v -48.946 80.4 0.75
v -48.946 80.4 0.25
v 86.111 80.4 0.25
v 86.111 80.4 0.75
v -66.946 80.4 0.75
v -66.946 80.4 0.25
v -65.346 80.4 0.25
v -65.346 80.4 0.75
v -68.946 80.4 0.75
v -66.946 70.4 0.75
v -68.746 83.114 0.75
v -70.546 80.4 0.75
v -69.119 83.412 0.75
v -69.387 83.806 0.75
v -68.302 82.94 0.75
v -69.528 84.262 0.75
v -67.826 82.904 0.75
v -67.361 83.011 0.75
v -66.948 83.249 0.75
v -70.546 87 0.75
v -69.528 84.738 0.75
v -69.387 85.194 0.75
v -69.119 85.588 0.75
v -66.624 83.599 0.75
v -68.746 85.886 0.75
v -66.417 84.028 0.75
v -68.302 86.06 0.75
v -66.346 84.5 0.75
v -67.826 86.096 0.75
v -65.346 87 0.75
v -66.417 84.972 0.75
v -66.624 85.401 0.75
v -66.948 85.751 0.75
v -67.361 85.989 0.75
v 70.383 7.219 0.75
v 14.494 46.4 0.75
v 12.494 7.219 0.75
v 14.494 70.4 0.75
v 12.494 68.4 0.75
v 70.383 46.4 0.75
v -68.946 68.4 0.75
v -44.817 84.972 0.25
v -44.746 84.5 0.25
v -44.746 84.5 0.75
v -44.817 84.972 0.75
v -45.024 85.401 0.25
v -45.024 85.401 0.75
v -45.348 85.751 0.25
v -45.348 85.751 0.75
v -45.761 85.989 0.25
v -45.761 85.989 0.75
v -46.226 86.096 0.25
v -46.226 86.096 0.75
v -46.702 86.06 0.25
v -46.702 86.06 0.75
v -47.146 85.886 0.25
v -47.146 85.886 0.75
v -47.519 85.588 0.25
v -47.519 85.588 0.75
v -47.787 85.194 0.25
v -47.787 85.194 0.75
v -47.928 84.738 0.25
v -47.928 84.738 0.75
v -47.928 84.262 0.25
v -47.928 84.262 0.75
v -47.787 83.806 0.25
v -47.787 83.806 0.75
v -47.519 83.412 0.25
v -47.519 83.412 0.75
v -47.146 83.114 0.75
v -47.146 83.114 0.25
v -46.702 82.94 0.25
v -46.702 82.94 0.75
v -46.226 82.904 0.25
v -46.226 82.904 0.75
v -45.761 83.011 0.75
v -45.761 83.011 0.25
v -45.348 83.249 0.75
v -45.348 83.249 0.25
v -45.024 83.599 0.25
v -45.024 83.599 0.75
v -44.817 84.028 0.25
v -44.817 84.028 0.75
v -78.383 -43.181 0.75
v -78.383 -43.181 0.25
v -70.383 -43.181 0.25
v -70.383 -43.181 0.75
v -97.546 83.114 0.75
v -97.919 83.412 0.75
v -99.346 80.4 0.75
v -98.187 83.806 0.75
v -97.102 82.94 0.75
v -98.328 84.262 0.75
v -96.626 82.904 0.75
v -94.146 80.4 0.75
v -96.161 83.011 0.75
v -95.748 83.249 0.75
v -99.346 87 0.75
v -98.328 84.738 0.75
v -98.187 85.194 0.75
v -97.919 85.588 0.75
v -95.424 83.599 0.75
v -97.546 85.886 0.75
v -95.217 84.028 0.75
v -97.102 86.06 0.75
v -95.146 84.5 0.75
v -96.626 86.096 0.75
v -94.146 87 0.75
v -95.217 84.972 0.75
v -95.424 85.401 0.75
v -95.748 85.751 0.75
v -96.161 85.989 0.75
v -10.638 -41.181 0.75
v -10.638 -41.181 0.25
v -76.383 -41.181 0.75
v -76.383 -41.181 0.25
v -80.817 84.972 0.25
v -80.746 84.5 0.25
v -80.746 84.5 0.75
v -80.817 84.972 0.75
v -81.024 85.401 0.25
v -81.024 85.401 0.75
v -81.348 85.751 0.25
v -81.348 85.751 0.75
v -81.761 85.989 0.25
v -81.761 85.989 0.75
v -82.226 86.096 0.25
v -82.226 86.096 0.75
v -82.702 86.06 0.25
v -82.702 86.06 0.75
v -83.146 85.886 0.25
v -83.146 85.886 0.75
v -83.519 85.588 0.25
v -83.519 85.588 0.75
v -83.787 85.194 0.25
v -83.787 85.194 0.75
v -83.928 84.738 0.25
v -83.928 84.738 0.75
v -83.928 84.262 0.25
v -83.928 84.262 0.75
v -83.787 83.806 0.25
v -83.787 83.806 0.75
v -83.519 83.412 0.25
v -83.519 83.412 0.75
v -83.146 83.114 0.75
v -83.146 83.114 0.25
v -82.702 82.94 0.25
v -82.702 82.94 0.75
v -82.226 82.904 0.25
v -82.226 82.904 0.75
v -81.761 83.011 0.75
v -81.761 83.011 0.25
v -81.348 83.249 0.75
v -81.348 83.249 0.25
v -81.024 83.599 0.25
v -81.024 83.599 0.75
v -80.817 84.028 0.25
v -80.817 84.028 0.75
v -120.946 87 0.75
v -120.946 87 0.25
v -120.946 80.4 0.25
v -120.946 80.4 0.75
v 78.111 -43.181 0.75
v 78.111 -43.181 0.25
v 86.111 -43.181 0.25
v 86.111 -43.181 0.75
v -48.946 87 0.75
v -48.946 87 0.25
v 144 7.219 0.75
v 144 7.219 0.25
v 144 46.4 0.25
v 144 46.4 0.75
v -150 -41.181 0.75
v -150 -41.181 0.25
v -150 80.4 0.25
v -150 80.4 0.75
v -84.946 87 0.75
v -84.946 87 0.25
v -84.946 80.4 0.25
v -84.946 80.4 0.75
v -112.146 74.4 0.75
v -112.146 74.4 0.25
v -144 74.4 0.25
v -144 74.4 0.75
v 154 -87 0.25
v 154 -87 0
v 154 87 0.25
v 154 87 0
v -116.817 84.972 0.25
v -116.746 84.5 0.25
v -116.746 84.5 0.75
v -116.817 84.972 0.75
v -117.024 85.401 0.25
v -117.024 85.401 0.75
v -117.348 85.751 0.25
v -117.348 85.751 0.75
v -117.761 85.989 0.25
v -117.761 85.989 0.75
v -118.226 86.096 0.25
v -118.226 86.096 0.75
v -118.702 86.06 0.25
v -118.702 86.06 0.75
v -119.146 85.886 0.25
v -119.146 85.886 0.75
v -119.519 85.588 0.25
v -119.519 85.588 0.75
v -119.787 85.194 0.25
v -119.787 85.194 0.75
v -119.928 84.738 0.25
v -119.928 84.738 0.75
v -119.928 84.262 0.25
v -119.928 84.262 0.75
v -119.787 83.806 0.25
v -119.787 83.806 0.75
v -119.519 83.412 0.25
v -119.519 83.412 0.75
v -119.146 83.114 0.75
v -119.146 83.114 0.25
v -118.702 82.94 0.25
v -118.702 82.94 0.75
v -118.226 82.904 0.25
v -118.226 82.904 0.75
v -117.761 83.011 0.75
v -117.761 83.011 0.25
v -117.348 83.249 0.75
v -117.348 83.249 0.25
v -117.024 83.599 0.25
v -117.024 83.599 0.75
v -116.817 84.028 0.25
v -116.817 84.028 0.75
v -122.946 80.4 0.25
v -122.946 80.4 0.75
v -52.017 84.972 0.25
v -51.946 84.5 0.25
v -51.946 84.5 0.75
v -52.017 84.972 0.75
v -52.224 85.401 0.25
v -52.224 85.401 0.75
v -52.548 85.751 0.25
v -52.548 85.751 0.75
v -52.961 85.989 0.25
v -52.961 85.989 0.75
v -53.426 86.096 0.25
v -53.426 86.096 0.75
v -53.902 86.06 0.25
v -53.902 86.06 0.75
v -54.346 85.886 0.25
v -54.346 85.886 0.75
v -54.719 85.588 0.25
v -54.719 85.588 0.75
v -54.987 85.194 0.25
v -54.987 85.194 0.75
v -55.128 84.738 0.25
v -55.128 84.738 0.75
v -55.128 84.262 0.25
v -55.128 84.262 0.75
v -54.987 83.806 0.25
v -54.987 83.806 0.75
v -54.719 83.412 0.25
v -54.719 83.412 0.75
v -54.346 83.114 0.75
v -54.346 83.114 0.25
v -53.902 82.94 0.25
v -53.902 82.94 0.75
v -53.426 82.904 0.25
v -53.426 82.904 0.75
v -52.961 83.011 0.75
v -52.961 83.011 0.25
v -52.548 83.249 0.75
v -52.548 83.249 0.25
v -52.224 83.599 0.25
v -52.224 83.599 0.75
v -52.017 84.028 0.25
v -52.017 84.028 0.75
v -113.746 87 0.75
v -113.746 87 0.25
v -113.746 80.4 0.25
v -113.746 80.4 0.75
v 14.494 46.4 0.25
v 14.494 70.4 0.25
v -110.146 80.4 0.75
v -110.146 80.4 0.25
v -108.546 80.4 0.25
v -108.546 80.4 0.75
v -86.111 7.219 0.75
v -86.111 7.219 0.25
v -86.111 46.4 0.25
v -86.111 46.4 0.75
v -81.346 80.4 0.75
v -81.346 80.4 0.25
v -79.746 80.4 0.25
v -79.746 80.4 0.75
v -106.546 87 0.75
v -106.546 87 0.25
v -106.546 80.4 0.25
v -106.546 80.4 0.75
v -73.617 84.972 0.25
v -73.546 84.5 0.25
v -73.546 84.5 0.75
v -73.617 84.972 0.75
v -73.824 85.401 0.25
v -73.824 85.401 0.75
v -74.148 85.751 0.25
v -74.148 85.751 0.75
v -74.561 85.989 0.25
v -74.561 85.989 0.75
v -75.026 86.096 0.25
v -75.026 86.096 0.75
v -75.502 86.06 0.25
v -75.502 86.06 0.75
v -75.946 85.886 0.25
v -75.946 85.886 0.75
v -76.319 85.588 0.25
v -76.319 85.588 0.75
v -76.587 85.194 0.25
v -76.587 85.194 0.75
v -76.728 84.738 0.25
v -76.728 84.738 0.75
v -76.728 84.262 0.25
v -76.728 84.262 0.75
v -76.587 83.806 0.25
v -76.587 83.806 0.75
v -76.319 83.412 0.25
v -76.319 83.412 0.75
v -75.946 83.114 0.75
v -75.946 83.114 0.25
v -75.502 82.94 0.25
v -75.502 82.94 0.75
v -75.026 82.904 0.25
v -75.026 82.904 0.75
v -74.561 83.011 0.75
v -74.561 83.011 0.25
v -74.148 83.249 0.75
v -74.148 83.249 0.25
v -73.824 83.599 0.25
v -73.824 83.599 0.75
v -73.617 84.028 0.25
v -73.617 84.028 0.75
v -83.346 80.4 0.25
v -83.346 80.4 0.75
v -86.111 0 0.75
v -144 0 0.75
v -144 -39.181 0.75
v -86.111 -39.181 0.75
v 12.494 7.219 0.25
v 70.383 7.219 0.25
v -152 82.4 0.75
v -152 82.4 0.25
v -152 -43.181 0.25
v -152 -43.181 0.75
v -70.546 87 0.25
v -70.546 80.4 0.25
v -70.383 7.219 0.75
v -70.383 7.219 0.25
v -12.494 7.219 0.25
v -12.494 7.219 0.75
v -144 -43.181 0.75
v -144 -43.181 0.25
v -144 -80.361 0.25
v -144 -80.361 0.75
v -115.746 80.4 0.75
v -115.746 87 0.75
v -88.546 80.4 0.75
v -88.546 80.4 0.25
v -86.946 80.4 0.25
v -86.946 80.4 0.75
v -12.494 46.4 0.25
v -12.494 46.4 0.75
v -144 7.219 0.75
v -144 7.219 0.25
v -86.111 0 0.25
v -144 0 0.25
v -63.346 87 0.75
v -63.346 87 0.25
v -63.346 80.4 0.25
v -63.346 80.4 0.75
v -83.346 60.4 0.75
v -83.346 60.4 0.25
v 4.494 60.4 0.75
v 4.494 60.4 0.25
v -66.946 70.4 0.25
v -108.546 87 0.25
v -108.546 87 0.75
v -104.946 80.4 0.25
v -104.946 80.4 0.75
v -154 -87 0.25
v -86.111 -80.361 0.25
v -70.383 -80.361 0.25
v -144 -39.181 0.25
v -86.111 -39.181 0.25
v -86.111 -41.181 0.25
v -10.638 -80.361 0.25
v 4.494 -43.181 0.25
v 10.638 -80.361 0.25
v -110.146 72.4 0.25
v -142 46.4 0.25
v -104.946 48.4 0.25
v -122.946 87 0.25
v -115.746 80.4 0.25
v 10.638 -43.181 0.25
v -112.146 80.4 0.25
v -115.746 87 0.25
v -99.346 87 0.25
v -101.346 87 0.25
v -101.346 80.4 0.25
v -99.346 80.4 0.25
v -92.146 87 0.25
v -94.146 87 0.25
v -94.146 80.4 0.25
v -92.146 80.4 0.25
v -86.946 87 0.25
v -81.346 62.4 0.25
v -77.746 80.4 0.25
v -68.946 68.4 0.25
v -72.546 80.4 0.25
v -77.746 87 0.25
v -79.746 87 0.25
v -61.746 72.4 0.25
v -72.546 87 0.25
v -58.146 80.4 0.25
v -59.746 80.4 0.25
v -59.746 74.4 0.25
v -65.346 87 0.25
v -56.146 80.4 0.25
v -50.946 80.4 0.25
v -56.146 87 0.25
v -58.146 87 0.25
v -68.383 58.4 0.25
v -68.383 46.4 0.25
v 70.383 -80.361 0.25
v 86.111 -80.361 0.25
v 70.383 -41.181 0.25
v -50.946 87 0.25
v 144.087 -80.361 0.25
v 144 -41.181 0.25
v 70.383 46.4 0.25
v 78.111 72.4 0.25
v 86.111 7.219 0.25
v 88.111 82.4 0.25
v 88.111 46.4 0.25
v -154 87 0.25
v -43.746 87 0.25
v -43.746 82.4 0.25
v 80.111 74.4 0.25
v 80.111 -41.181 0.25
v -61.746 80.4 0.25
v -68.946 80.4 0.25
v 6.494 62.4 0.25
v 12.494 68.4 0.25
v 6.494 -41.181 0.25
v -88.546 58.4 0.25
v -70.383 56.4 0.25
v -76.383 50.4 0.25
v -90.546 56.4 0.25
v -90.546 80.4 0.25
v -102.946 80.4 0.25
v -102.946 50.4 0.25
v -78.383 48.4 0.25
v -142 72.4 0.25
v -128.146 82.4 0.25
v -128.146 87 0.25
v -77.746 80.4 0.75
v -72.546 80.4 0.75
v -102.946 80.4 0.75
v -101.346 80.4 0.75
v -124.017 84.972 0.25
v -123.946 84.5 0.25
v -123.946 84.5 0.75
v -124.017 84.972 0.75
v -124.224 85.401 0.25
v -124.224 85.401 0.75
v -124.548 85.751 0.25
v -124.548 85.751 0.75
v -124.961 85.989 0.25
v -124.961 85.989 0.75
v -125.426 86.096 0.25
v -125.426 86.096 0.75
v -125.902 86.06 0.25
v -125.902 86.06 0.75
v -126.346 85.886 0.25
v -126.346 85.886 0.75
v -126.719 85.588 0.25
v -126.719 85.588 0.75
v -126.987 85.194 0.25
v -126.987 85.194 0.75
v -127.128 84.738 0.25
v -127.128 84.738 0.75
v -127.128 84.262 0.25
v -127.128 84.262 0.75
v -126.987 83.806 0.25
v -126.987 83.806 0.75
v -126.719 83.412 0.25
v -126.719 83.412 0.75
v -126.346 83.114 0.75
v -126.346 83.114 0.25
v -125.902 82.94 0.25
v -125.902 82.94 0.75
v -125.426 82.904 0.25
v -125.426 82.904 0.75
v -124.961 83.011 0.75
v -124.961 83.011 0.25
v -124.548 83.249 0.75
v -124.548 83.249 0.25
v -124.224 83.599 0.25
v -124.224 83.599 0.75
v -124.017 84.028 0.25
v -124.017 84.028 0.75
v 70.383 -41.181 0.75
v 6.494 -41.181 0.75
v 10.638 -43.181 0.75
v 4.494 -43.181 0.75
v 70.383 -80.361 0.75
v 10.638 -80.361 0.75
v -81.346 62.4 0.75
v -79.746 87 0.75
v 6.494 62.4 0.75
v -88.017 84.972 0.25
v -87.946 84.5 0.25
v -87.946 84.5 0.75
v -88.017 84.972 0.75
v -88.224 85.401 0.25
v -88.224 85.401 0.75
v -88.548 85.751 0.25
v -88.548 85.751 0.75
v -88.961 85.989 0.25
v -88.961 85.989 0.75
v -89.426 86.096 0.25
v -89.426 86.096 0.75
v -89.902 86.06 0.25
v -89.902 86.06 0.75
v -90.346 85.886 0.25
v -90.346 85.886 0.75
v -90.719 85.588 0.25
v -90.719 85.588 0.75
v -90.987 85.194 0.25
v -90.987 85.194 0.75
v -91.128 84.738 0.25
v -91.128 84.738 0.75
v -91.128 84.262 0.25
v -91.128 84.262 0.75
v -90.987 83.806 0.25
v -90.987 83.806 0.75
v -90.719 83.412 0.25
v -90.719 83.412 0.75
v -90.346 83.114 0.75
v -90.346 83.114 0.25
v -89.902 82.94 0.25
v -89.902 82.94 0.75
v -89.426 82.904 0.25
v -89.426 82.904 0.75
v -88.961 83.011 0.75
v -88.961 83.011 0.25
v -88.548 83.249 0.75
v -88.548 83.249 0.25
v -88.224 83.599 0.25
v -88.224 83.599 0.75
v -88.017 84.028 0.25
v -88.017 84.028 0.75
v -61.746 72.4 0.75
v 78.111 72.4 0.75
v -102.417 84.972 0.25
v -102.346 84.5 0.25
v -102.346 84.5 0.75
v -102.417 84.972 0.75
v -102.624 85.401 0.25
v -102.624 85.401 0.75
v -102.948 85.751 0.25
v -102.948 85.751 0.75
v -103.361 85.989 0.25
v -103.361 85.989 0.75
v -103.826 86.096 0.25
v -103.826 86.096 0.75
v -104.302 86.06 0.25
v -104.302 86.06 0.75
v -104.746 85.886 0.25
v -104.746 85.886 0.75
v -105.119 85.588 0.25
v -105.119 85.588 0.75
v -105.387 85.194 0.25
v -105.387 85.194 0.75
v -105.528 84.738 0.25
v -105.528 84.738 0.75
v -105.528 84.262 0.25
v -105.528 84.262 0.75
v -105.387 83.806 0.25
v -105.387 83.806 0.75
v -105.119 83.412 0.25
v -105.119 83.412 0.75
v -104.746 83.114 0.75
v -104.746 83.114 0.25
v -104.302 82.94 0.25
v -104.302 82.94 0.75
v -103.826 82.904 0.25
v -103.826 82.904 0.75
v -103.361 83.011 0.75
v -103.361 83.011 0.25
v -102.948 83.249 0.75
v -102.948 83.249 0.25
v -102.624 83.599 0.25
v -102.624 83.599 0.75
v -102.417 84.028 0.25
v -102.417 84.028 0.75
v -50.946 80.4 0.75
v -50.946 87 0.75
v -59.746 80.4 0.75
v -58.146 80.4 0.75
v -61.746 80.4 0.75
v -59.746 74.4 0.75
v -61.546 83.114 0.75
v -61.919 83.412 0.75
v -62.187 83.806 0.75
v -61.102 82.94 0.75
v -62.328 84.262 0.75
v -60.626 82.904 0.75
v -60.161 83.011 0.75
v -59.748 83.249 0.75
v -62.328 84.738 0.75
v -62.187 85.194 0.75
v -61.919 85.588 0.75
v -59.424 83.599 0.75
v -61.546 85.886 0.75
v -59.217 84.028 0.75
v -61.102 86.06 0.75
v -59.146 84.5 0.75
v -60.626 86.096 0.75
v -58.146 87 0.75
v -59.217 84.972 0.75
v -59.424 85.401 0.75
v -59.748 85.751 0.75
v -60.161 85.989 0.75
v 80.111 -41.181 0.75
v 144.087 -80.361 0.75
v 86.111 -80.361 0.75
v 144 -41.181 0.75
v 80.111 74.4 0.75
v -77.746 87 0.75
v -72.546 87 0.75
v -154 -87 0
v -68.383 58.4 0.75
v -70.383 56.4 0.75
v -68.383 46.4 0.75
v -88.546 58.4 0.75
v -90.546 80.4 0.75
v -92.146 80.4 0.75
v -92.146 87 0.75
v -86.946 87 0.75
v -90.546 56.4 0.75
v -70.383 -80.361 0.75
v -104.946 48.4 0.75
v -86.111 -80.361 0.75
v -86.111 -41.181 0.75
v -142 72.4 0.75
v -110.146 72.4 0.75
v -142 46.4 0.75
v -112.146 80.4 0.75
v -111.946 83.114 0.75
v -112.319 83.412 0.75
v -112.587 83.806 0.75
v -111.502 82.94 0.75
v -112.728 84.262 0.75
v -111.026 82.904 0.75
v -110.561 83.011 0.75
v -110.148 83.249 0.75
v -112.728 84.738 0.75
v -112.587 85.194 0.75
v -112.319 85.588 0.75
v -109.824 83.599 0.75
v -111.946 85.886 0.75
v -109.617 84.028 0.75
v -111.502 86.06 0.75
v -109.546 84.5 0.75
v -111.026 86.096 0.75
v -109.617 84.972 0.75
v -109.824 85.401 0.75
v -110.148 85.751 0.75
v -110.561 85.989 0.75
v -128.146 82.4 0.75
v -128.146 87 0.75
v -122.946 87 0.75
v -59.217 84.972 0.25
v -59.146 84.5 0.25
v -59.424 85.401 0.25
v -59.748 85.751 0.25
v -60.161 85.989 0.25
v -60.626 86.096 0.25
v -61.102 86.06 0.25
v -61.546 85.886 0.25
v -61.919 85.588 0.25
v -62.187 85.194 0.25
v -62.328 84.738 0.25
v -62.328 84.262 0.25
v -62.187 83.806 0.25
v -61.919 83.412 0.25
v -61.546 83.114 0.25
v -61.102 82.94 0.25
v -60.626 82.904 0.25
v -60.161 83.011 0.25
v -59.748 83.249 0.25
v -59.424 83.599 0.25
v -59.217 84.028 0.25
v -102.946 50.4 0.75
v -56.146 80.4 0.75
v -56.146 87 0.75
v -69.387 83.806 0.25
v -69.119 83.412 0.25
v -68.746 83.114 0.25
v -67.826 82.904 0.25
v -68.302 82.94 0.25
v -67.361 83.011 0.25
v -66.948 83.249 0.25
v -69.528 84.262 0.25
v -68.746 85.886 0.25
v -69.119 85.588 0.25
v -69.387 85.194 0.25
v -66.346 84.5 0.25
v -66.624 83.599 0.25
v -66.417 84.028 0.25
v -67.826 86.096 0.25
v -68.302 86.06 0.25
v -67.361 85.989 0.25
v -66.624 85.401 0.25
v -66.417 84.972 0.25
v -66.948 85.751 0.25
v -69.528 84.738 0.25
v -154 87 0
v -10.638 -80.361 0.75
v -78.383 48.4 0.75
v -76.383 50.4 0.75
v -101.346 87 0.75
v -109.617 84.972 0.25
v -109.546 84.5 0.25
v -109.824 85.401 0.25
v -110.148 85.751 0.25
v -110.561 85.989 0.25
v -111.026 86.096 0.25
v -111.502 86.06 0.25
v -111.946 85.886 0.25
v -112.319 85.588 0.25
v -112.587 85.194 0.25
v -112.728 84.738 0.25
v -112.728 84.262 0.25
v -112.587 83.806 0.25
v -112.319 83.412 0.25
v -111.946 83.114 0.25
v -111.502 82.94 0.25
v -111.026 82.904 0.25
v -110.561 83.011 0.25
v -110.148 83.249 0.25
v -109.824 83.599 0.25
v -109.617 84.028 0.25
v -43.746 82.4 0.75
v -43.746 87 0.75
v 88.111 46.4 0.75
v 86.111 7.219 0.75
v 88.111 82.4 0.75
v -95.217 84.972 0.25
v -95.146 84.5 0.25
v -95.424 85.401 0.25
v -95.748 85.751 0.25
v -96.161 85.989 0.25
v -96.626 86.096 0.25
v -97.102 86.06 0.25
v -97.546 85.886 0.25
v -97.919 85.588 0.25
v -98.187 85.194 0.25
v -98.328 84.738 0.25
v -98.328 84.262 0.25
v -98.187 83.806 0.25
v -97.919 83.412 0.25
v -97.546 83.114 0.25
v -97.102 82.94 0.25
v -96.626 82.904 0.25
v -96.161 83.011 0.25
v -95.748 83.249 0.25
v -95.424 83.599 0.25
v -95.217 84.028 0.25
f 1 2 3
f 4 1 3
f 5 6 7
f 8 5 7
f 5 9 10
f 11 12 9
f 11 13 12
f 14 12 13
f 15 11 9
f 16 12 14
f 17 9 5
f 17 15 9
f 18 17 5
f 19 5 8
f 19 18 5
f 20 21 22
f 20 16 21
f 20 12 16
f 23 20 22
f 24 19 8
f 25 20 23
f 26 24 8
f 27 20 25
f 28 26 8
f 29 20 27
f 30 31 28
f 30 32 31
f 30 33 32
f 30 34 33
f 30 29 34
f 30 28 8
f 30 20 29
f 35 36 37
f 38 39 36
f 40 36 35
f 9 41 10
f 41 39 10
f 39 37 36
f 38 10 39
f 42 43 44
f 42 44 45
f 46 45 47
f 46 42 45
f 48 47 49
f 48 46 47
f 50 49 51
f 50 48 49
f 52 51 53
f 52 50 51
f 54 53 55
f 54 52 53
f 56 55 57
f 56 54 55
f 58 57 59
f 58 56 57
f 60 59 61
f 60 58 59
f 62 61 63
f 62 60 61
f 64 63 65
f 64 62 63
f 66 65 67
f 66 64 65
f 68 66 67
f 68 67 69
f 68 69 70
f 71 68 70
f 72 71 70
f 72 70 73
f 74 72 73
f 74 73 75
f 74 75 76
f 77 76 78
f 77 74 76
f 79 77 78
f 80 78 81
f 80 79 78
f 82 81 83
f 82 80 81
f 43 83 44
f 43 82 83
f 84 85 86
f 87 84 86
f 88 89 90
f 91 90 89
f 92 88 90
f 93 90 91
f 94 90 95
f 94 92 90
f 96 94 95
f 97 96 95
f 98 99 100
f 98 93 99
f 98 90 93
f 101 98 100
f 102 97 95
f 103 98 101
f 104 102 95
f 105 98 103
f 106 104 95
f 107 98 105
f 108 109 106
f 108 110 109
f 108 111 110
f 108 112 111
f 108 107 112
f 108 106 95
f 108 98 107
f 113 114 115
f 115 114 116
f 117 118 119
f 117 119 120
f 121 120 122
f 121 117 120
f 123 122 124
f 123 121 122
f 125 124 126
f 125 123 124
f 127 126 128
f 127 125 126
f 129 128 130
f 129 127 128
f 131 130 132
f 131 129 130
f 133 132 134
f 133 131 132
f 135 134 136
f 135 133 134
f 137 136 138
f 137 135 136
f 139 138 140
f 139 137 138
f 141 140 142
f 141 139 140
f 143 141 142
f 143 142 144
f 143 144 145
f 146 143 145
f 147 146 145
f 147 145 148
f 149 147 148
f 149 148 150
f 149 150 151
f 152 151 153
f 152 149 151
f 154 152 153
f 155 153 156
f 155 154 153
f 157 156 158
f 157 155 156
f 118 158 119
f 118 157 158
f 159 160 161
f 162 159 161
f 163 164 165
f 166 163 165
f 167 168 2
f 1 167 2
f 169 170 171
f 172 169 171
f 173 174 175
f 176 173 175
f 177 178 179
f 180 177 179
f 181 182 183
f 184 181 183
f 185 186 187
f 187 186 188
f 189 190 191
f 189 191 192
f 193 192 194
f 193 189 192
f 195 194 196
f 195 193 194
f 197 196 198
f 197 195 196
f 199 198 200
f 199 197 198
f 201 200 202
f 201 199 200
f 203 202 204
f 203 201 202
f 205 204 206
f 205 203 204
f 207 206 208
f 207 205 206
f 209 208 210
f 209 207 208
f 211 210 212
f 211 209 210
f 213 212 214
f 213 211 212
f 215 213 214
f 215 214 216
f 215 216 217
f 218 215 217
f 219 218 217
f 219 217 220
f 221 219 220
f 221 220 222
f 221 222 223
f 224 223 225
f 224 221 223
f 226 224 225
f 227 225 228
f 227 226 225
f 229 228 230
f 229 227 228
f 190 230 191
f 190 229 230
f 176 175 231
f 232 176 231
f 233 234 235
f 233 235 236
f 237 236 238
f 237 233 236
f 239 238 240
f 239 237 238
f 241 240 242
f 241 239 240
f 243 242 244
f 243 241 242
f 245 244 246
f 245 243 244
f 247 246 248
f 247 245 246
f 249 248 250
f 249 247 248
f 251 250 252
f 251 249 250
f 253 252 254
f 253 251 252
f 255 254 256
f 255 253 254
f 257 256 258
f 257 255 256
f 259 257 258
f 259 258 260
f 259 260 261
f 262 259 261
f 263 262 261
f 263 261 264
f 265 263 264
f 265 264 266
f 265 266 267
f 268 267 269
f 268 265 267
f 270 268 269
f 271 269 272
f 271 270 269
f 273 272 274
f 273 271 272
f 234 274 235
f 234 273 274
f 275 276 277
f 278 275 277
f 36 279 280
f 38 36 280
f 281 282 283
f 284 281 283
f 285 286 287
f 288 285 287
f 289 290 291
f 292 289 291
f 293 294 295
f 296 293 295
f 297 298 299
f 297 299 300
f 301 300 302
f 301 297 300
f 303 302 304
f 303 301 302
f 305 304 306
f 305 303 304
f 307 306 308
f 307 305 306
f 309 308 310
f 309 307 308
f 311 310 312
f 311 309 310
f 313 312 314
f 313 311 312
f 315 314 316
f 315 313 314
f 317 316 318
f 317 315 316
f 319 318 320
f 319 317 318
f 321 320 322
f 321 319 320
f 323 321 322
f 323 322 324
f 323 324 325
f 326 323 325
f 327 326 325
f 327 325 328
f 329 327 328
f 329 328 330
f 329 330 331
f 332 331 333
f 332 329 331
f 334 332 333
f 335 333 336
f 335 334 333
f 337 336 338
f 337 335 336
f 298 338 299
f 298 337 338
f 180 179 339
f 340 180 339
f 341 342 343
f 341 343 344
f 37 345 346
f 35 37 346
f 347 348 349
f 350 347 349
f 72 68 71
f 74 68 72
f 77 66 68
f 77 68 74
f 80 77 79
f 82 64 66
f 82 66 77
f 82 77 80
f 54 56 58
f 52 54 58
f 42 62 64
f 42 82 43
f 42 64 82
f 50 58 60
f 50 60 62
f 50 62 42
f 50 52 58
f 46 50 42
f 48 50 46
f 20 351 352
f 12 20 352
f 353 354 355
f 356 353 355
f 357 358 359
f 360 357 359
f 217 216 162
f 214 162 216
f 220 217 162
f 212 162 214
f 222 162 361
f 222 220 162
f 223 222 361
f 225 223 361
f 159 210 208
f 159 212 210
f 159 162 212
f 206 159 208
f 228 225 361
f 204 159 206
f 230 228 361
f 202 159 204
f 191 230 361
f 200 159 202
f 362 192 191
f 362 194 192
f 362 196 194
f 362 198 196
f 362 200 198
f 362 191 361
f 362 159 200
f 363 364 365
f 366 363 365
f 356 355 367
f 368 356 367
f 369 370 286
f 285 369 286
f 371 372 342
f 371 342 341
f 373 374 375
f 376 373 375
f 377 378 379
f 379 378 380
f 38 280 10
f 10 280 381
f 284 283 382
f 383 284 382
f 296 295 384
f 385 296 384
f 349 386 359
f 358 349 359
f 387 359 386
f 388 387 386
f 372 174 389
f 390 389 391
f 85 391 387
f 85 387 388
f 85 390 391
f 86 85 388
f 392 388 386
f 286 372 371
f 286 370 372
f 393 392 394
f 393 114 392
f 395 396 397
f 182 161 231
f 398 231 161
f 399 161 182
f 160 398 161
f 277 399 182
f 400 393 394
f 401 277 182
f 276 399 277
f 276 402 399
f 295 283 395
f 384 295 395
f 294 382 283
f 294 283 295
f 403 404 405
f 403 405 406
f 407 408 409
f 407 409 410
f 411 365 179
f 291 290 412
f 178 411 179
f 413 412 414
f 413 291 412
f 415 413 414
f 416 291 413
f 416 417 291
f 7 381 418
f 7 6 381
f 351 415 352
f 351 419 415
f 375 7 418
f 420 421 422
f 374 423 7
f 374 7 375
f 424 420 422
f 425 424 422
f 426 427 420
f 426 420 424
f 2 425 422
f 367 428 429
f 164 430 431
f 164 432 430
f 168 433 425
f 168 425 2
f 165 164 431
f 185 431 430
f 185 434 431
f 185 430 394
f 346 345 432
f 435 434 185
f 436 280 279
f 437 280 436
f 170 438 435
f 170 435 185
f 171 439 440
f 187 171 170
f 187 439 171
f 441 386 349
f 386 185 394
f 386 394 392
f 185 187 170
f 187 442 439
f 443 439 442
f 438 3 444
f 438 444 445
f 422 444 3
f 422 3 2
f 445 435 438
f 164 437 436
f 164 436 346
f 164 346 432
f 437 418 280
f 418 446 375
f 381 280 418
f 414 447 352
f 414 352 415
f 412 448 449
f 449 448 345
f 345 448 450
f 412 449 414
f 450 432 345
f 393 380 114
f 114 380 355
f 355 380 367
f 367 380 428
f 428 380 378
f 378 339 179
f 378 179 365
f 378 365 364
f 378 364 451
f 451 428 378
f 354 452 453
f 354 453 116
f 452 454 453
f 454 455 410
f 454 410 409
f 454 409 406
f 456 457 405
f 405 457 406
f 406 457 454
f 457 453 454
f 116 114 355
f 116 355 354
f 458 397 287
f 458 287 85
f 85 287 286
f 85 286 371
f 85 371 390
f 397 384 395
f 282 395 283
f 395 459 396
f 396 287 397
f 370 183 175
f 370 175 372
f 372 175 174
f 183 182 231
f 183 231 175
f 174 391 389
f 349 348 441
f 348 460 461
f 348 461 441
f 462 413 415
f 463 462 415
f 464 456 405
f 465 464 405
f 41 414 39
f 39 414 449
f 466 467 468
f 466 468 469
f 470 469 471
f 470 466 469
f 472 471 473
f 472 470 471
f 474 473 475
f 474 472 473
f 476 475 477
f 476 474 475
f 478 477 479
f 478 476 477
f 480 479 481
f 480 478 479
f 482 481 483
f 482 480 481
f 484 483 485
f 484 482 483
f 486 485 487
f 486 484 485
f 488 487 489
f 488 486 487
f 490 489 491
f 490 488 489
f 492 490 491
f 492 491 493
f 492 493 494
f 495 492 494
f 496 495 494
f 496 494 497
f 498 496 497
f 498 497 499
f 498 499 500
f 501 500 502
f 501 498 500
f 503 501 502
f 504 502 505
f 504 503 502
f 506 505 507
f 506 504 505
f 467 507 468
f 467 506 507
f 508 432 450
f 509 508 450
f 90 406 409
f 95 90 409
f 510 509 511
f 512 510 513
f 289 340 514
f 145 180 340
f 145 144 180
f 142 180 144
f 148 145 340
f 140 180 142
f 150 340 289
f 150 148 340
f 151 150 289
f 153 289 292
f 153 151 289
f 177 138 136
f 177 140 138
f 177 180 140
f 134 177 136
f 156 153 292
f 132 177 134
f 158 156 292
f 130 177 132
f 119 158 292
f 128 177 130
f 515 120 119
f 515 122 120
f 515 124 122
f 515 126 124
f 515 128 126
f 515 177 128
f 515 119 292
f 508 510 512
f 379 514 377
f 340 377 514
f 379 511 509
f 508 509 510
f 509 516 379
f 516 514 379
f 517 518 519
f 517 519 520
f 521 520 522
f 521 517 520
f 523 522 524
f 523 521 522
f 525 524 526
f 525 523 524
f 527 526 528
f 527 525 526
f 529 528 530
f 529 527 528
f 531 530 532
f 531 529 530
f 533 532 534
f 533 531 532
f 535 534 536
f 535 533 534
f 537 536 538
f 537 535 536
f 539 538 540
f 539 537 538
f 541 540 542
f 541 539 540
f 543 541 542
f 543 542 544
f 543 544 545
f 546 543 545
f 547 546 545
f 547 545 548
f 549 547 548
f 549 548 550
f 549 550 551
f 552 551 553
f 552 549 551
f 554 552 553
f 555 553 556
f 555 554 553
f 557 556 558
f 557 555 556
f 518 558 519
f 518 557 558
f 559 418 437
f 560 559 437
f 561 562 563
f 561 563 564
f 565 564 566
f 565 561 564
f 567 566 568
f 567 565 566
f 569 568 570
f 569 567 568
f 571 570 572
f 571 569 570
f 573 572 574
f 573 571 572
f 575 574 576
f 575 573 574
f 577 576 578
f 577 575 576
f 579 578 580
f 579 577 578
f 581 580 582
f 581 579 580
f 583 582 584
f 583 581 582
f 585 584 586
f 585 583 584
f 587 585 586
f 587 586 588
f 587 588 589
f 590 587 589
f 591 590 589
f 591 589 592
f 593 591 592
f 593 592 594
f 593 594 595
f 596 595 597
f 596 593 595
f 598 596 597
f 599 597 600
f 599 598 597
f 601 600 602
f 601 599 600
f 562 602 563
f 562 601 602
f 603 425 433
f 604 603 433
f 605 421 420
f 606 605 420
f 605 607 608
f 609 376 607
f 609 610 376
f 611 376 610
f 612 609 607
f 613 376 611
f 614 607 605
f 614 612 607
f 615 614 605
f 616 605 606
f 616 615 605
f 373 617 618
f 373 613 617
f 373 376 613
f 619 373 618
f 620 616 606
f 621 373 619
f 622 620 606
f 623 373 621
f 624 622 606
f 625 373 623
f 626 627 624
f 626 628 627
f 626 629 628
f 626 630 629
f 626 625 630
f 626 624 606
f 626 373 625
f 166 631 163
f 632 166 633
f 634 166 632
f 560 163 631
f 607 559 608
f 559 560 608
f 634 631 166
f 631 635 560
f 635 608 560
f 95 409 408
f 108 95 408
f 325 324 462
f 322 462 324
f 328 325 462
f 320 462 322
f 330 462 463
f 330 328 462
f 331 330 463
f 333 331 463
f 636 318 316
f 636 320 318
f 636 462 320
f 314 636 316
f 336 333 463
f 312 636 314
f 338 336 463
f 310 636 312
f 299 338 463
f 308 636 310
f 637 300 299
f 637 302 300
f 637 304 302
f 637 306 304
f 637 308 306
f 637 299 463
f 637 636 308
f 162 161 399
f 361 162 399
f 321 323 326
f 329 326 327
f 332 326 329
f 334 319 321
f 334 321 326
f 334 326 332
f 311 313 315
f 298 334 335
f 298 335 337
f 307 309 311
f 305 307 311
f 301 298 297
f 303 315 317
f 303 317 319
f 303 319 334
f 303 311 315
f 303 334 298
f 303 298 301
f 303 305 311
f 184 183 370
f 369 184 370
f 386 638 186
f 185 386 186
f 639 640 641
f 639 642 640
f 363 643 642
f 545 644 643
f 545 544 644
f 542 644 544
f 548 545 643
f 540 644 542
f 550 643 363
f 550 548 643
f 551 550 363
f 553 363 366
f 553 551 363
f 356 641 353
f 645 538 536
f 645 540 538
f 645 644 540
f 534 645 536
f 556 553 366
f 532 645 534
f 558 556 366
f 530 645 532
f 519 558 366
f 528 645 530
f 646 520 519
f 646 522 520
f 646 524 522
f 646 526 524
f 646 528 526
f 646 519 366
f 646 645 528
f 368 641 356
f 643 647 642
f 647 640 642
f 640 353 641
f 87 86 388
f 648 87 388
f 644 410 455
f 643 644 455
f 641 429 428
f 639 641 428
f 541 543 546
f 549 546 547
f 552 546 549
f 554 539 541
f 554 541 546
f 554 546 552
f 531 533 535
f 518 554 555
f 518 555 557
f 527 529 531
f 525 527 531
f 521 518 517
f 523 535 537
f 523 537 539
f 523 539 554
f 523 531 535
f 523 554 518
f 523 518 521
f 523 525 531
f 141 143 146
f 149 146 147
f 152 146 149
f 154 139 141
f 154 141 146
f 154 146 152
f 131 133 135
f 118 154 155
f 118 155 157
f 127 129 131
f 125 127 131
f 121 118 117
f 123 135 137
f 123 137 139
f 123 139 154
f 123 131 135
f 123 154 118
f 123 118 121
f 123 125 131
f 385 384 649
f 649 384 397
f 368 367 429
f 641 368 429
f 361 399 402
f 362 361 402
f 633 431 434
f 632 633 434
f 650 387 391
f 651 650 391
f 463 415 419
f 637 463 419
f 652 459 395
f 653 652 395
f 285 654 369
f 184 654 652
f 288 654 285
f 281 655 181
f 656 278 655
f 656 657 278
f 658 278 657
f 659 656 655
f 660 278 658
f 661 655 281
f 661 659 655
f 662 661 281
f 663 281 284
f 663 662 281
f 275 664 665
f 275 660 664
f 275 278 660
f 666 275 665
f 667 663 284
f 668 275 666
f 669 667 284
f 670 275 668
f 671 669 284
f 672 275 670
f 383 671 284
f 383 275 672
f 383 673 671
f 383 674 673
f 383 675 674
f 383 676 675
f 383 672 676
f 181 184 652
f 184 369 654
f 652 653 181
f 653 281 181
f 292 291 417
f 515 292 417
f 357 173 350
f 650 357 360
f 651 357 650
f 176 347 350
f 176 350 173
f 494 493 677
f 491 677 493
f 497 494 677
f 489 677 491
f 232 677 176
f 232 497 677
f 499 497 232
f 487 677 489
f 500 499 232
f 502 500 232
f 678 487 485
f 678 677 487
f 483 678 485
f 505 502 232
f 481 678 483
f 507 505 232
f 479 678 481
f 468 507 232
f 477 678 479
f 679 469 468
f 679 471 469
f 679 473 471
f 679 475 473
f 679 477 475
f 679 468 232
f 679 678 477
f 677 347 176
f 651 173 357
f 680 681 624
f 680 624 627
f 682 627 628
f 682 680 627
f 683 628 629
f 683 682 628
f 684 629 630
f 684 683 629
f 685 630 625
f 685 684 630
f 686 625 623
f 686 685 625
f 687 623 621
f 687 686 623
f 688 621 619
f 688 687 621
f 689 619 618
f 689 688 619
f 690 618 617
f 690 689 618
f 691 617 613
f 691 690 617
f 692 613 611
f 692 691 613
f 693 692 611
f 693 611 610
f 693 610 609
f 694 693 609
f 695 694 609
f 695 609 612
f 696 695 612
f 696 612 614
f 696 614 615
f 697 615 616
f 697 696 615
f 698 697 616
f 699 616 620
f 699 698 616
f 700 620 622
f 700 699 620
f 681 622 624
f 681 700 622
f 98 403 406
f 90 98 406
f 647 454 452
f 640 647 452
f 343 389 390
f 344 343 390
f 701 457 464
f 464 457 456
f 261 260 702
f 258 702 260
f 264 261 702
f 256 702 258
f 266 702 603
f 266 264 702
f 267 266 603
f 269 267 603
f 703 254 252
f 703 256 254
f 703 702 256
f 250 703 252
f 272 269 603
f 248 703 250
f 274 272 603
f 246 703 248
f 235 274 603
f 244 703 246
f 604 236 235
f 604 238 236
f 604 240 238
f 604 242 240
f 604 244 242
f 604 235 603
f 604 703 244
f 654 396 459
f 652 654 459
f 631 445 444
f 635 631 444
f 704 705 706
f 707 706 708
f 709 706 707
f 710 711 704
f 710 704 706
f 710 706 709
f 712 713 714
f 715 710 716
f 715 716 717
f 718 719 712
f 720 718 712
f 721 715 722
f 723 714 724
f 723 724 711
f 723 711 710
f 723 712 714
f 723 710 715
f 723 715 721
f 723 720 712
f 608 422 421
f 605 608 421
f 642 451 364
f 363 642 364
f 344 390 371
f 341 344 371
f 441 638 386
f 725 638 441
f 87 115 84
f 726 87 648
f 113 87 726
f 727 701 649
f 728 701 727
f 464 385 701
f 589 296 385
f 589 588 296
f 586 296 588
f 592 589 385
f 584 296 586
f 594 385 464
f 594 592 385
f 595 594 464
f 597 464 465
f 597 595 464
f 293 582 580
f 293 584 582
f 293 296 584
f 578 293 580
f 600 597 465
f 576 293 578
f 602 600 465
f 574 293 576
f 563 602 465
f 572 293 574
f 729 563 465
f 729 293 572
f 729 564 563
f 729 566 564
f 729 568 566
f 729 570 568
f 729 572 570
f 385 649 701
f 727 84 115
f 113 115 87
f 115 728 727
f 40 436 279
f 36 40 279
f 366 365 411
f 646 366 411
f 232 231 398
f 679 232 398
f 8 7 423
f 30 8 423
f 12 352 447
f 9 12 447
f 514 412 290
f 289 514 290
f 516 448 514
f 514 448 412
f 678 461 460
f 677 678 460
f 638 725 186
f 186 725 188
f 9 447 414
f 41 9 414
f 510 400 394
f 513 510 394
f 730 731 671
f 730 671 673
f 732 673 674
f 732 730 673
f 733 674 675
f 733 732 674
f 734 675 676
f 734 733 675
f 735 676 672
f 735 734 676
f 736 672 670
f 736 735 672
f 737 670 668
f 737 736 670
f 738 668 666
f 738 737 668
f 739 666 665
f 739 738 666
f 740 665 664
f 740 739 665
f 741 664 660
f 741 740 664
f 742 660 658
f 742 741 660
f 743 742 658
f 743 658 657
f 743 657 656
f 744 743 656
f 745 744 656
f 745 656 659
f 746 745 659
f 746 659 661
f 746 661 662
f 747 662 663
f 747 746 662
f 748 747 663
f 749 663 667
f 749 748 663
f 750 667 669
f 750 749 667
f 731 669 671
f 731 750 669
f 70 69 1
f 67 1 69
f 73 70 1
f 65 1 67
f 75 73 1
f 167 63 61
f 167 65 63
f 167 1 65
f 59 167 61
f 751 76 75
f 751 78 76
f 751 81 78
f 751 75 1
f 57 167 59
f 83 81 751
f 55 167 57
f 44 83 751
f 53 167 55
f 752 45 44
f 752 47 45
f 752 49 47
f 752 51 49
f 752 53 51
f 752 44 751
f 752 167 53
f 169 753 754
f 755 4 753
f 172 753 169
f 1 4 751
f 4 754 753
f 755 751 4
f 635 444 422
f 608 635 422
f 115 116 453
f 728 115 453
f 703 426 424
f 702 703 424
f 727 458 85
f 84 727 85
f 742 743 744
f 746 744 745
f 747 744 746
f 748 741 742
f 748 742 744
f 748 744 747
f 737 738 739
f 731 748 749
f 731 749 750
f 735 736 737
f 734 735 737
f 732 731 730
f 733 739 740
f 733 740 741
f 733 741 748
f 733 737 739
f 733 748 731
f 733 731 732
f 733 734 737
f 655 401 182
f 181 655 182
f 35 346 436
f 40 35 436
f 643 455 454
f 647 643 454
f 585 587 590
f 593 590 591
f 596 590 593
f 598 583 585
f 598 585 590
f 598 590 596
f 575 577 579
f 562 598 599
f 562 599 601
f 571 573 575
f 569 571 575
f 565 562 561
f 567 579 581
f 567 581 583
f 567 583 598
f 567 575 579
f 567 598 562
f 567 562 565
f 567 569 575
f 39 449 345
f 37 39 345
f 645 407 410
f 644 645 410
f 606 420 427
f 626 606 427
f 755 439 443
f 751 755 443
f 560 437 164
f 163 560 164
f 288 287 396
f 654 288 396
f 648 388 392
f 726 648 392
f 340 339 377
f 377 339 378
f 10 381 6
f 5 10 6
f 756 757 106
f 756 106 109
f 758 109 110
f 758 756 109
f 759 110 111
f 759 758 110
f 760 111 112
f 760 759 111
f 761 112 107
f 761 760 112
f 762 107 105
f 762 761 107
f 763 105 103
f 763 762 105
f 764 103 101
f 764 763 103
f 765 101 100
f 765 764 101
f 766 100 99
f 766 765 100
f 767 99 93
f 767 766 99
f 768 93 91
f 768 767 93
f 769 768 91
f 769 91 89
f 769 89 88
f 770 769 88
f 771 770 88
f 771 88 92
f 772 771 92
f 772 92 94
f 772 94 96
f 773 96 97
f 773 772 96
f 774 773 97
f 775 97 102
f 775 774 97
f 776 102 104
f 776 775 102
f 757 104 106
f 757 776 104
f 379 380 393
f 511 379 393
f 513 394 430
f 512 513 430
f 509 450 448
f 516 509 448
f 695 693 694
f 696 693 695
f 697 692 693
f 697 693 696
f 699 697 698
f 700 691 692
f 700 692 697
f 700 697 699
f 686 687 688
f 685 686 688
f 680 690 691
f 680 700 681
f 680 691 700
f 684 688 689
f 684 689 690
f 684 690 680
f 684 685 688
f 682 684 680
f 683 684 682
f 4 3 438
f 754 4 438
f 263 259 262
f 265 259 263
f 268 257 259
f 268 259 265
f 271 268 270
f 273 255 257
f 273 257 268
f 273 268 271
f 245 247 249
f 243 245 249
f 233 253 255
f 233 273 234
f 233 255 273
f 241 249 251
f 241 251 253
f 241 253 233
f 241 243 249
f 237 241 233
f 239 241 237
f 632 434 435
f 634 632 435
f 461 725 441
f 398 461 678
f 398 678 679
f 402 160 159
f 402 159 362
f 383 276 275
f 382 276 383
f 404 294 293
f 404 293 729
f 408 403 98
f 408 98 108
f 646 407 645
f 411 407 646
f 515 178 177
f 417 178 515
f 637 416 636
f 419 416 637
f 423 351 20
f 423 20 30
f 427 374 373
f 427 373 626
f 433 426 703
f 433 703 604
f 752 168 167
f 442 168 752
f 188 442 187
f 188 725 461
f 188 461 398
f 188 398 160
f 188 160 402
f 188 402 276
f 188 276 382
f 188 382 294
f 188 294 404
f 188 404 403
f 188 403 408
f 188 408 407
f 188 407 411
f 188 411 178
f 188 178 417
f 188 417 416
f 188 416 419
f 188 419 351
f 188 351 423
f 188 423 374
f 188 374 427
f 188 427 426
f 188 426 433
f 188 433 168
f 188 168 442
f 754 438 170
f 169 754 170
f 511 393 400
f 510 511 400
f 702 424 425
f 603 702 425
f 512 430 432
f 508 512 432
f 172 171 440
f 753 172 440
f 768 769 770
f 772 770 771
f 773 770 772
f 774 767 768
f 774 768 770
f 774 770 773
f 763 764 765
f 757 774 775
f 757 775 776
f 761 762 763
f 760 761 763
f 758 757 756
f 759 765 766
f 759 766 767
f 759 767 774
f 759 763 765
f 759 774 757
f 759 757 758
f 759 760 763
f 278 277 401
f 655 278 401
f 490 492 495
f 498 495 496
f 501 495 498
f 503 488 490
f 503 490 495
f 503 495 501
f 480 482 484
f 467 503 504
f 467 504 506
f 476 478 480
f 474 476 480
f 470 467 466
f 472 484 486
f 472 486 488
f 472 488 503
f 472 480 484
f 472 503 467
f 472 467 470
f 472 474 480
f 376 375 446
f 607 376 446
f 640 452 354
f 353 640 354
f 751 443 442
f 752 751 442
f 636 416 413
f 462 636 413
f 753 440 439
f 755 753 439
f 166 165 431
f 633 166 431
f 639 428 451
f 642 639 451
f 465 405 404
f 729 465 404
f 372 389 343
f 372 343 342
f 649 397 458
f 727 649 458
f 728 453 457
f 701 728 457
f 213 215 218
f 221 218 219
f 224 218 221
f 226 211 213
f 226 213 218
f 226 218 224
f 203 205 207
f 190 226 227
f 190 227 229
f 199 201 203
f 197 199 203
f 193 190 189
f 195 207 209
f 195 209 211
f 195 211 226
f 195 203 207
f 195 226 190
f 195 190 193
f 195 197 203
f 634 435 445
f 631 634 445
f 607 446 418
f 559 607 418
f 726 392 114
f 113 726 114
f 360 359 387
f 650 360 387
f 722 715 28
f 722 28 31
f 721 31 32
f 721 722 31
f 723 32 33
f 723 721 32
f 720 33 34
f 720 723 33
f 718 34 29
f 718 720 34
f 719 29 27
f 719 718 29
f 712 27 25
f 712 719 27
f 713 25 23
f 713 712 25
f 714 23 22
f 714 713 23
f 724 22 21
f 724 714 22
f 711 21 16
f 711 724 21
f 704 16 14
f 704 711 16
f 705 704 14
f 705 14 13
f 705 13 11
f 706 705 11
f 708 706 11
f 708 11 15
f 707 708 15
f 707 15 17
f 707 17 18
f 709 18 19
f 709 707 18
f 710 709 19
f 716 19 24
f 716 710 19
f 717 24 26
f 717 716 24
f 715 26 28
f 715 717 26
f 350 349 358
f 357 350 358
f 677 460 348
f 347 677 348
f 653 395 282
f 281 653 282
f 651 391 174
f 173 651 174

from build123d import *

# Parameters (mm, degrees)
F0_W     = 308
F0_H     = 174
F1_DEPTH = 0.25
F2_R     = 1.6
F2_W     = 57.88946
F2_H     = 39.180715
F3_DEPTH = 0.5


with BuildPart() as f1:
    # F0 (on Top) → F1 (new body)
    with BuildSketch(Plane.XY):
        Rectangle(F0_W, F0_H)
    extrude(amount=F1_DEPTH)

    # F2 (on face) → F3 (join)
    with BuildSketch(Plane.XY.offset(0.25)):
        Polygon((-86.945909, 80.4), (-86.945909, 87), (-92.145909, 87), (-92.145909, 80.4), (-90.545909, 80.4), (-88.545909, 80.4), align=None)
        with Locations((-89.545909, 84.5)):
            Circle(F2_R, mode=Mode.SUBTRACT)
        Polygon((-88.545909, 58.4), (-88.545909, 80.4), (-90.545909, 80.4), (-90.545909, 56.4), (-70.383385, 56.4), (-70.383385, 46.4), (-68.383385, 46.4), (-68.383385, 58.4), align=None)
        Polygon((-12.493925, 46.4), (-68.383385, 46.4), (-70.383385, 46.4), (-70.383385, 7.219285), (-12.493925, 7.219285), align=None)
        Polygon((-94.145909, 87), (-99.345909, 87), (-99.345909, 80.4), (-97.745909, 80.4), (-95.745909, 80.4), (-94.145909, 80.4), align=None)
        with Locations((-96.745909, 84.5)):
            Circle(F2_R, mode=Mode.SUBTRACT)
        Polygon((-101.345909, 87), (-106.545909, 87), (-106.545909, 80.4), (-104.945909, 80.4), (-102.945909, 80.4), (-101.345909, 80.4), align=None)
        with Locations((-103.945909, 84.5)):
            Circle(F2_R, mode=Mode.SUBTRACT)
        Polygon((-102.945909, 80.4), (-104.945909, 80.4), (-104.945909, 48.4), (-78.383385, 48.4), (-78.383385, -43.180715), (-70.383385, -43.180715), (-70.383385, -41.180715), (-76.383385, -41.180715), (-76.383385, 50.4), (-102.945909, 50.4), align=None)
        Polygon((-70.383385, -41.180715), (-70.383385, -43.180715), (-70.383385, -80.36143), (-10.637844, -80.36143), (-10.637844, -41.180715), align=None)
        Polygon((-108.545909, 87), (-113.745909, 87), (-113.745909, 80.4), (-112.145909, 80.4), (-110.145909, 80.4), (-108.545909, 80.4), align=None)
        with Locations((-111.145909, 84.5)):
            Circle(F2_R, mode=Mode.SUBTRACT)
        Polygon((-110.145909, 80.4), (-112.145909, 80.4), (-112.145909, 74.4), (-144, 74.4), (-144, 46.4), (-142, 46.4), (-142, 72.4), (-110.145909, 72.4), align=None)
        Polygon((-142, 46.4), (-144, 46.4), (-144, 7.219285), (-86.11054, 7.219285), (-86.11054, 46.4), align=None)
        Polygon((-115.745909, 87), (-120.945909, 87), (-120.945909, 80.4), (-119.345909, 80.4), (-117.345909, 80.4), (-115.745909, 80.4), align=None)
        with Locations((-118.345909, 84.5)):
            Circle(F2_R, mode=Mode.SUBTRACT)
        Polygon((-122.945909, 87), (-128.145909, 87), (-128.145909, 82.4), (-128.145909, 80.4), (-122.945909, 80.4), align=None)
        with Locations((-125.545909, 84.5)):
            Circle(F2_R, mode=Mode.SUBTRACT)
        Polygon((-128.145909, 80.4), (-128.145909, 82.4), (-152, 82.4), (-152, -43.180715), (-144, -43.180715), (-144, -41.180715), (-150, -41.180715), (-150, 80.4), align=None)
        Polygon((-144, -41.180715), (-144, -43.180715), (-144, -80.36143), (-86.11054, -80.36143), (-86.11054, -41.180715), align=None)
        Polygon((-81.345909, 80.4), (-79.745909, 80.4), (-79.745909, 87), (-84.945909, 87), (-84.945909, 80.4), (-83.345909, 80.4), align=None)
        with Locations((-82.345909, 84.5)):
            Circle(F2_R, mode=Mode.SUBTRACT)
        Polygon((-81.345909, 62.4), (-81.345909, 80.4), (-83.345909, 80.4), (-83.345909, 60.4), (4.493925, 60.4), (4.493925, -43.180715), (10.637844, -43.180715), (10.637844, -41.180715), (6.493925, -41.180715), (6.493925, 62.4), align=None)
        Polygon((70.383385, -41.180715), (10.637844, -41.180715), (10.637844, -43.180715), (10.637844, -80.36143), (70.383385, -80.36143), align=None)
        Polygon((-72.545909, 87), (-77.745909, 87), (-77.745909, 80.4), (-76.145909, 80.4), (-74.145909, 80.4), (-72.545909, 80.4), align=None)
        with Locations((-75.145909, 84.5)):
            Circle(F2_R, mode=Mode.SUBTRACT)
        Polygon((-65.345909, 87), (-70.545909, 87), (-70.545909, 80.4), (-68.945909, 80.4), (-66.945909, 80.4), (-65.345909, 80.4), align=None)
        with Locations((-67.945909, 84.5)):
            Circle(F2_R, mode=Mode.SUBTRACT)
        Polygon((-66.945909, 80.4), (-68.945909, 80.4), (-68.945909, 68.4), (12.493925, 68.4), (12.493925, 46.4), (14.493925, 46.4), (14.493925, 70.4), (-66.945909, 70.4), align=None)
        Polygon((14.493925, 46.4), (12.493925, 46.4), (12.493925, 7.219285), (70.383385, 7.219285), (70.383385, 46.4), align=None)
        Polygon((-58.145909, 87), (-63.345909, 87), (-63.345909, 80.4), (-61.745909, 80.4), (-59.745909, 80.4), (-58.145909, 80.4), align=None)
        with Locations((-60.745909, 84.5)):
            Circle(F2_R, mode=Mode.SUBTRACT)
        Polygon((-59.745909, 80.4), (-61.745909, 80.4), (-61.745909, 72.4), (78.11054, 72.4), (78.11054, -43.180715), (86.11054, -43.180715), (86.11054, -41.180715), (80.11054, -41.180715), (80.11054, 74.4), (-59.745909, 74.4), align=None)
        Polygon((86.11054, -41.180715), (86.11054, -43.180715), (86.11054, -80.36143), (144.087264, -80.36143), (144, -41.180715), align=None)
        Polygon((-50.945909, 87), (-56.145909, 87), (-56.145909, 80.4), (-54.545909, 80.4), (-52.545909, 80.4), (-50.945909, 80.4), align=None)
        with Locations((-53.545909, 84.5)):
            Circle(F2_R, mode=Mode.SUBTRACT)
        Polygon((-43.745909, 87), (-48.945909, 87), (-48.945909, 80.4), (-43.745909, 80.4), (-43.745909, 82.4), align=None)
        with Locations((-46.345909, 84.5)):
            Circle(F2_R, mode=Mode.SUBTRACT)
        Polygon((-43.745909, 82.4), (-43.745909, 80.4), (86.11054, 80.4), (86.11054, 46.4), (88.11054, 46.4), (88.11054, 82.4), align=None)
        Polygon((88.11054, 46.4), (86.11054, 46.4), (86.11054, 7.219285), (144, 7.219285), (144, 46.4), align=None)
        with Locations((-115.05527, -19.590357)):
            Rectangle(F2_W, F2_H)
    extrude(amount=F3_DEPTH)


solid = f1.part
